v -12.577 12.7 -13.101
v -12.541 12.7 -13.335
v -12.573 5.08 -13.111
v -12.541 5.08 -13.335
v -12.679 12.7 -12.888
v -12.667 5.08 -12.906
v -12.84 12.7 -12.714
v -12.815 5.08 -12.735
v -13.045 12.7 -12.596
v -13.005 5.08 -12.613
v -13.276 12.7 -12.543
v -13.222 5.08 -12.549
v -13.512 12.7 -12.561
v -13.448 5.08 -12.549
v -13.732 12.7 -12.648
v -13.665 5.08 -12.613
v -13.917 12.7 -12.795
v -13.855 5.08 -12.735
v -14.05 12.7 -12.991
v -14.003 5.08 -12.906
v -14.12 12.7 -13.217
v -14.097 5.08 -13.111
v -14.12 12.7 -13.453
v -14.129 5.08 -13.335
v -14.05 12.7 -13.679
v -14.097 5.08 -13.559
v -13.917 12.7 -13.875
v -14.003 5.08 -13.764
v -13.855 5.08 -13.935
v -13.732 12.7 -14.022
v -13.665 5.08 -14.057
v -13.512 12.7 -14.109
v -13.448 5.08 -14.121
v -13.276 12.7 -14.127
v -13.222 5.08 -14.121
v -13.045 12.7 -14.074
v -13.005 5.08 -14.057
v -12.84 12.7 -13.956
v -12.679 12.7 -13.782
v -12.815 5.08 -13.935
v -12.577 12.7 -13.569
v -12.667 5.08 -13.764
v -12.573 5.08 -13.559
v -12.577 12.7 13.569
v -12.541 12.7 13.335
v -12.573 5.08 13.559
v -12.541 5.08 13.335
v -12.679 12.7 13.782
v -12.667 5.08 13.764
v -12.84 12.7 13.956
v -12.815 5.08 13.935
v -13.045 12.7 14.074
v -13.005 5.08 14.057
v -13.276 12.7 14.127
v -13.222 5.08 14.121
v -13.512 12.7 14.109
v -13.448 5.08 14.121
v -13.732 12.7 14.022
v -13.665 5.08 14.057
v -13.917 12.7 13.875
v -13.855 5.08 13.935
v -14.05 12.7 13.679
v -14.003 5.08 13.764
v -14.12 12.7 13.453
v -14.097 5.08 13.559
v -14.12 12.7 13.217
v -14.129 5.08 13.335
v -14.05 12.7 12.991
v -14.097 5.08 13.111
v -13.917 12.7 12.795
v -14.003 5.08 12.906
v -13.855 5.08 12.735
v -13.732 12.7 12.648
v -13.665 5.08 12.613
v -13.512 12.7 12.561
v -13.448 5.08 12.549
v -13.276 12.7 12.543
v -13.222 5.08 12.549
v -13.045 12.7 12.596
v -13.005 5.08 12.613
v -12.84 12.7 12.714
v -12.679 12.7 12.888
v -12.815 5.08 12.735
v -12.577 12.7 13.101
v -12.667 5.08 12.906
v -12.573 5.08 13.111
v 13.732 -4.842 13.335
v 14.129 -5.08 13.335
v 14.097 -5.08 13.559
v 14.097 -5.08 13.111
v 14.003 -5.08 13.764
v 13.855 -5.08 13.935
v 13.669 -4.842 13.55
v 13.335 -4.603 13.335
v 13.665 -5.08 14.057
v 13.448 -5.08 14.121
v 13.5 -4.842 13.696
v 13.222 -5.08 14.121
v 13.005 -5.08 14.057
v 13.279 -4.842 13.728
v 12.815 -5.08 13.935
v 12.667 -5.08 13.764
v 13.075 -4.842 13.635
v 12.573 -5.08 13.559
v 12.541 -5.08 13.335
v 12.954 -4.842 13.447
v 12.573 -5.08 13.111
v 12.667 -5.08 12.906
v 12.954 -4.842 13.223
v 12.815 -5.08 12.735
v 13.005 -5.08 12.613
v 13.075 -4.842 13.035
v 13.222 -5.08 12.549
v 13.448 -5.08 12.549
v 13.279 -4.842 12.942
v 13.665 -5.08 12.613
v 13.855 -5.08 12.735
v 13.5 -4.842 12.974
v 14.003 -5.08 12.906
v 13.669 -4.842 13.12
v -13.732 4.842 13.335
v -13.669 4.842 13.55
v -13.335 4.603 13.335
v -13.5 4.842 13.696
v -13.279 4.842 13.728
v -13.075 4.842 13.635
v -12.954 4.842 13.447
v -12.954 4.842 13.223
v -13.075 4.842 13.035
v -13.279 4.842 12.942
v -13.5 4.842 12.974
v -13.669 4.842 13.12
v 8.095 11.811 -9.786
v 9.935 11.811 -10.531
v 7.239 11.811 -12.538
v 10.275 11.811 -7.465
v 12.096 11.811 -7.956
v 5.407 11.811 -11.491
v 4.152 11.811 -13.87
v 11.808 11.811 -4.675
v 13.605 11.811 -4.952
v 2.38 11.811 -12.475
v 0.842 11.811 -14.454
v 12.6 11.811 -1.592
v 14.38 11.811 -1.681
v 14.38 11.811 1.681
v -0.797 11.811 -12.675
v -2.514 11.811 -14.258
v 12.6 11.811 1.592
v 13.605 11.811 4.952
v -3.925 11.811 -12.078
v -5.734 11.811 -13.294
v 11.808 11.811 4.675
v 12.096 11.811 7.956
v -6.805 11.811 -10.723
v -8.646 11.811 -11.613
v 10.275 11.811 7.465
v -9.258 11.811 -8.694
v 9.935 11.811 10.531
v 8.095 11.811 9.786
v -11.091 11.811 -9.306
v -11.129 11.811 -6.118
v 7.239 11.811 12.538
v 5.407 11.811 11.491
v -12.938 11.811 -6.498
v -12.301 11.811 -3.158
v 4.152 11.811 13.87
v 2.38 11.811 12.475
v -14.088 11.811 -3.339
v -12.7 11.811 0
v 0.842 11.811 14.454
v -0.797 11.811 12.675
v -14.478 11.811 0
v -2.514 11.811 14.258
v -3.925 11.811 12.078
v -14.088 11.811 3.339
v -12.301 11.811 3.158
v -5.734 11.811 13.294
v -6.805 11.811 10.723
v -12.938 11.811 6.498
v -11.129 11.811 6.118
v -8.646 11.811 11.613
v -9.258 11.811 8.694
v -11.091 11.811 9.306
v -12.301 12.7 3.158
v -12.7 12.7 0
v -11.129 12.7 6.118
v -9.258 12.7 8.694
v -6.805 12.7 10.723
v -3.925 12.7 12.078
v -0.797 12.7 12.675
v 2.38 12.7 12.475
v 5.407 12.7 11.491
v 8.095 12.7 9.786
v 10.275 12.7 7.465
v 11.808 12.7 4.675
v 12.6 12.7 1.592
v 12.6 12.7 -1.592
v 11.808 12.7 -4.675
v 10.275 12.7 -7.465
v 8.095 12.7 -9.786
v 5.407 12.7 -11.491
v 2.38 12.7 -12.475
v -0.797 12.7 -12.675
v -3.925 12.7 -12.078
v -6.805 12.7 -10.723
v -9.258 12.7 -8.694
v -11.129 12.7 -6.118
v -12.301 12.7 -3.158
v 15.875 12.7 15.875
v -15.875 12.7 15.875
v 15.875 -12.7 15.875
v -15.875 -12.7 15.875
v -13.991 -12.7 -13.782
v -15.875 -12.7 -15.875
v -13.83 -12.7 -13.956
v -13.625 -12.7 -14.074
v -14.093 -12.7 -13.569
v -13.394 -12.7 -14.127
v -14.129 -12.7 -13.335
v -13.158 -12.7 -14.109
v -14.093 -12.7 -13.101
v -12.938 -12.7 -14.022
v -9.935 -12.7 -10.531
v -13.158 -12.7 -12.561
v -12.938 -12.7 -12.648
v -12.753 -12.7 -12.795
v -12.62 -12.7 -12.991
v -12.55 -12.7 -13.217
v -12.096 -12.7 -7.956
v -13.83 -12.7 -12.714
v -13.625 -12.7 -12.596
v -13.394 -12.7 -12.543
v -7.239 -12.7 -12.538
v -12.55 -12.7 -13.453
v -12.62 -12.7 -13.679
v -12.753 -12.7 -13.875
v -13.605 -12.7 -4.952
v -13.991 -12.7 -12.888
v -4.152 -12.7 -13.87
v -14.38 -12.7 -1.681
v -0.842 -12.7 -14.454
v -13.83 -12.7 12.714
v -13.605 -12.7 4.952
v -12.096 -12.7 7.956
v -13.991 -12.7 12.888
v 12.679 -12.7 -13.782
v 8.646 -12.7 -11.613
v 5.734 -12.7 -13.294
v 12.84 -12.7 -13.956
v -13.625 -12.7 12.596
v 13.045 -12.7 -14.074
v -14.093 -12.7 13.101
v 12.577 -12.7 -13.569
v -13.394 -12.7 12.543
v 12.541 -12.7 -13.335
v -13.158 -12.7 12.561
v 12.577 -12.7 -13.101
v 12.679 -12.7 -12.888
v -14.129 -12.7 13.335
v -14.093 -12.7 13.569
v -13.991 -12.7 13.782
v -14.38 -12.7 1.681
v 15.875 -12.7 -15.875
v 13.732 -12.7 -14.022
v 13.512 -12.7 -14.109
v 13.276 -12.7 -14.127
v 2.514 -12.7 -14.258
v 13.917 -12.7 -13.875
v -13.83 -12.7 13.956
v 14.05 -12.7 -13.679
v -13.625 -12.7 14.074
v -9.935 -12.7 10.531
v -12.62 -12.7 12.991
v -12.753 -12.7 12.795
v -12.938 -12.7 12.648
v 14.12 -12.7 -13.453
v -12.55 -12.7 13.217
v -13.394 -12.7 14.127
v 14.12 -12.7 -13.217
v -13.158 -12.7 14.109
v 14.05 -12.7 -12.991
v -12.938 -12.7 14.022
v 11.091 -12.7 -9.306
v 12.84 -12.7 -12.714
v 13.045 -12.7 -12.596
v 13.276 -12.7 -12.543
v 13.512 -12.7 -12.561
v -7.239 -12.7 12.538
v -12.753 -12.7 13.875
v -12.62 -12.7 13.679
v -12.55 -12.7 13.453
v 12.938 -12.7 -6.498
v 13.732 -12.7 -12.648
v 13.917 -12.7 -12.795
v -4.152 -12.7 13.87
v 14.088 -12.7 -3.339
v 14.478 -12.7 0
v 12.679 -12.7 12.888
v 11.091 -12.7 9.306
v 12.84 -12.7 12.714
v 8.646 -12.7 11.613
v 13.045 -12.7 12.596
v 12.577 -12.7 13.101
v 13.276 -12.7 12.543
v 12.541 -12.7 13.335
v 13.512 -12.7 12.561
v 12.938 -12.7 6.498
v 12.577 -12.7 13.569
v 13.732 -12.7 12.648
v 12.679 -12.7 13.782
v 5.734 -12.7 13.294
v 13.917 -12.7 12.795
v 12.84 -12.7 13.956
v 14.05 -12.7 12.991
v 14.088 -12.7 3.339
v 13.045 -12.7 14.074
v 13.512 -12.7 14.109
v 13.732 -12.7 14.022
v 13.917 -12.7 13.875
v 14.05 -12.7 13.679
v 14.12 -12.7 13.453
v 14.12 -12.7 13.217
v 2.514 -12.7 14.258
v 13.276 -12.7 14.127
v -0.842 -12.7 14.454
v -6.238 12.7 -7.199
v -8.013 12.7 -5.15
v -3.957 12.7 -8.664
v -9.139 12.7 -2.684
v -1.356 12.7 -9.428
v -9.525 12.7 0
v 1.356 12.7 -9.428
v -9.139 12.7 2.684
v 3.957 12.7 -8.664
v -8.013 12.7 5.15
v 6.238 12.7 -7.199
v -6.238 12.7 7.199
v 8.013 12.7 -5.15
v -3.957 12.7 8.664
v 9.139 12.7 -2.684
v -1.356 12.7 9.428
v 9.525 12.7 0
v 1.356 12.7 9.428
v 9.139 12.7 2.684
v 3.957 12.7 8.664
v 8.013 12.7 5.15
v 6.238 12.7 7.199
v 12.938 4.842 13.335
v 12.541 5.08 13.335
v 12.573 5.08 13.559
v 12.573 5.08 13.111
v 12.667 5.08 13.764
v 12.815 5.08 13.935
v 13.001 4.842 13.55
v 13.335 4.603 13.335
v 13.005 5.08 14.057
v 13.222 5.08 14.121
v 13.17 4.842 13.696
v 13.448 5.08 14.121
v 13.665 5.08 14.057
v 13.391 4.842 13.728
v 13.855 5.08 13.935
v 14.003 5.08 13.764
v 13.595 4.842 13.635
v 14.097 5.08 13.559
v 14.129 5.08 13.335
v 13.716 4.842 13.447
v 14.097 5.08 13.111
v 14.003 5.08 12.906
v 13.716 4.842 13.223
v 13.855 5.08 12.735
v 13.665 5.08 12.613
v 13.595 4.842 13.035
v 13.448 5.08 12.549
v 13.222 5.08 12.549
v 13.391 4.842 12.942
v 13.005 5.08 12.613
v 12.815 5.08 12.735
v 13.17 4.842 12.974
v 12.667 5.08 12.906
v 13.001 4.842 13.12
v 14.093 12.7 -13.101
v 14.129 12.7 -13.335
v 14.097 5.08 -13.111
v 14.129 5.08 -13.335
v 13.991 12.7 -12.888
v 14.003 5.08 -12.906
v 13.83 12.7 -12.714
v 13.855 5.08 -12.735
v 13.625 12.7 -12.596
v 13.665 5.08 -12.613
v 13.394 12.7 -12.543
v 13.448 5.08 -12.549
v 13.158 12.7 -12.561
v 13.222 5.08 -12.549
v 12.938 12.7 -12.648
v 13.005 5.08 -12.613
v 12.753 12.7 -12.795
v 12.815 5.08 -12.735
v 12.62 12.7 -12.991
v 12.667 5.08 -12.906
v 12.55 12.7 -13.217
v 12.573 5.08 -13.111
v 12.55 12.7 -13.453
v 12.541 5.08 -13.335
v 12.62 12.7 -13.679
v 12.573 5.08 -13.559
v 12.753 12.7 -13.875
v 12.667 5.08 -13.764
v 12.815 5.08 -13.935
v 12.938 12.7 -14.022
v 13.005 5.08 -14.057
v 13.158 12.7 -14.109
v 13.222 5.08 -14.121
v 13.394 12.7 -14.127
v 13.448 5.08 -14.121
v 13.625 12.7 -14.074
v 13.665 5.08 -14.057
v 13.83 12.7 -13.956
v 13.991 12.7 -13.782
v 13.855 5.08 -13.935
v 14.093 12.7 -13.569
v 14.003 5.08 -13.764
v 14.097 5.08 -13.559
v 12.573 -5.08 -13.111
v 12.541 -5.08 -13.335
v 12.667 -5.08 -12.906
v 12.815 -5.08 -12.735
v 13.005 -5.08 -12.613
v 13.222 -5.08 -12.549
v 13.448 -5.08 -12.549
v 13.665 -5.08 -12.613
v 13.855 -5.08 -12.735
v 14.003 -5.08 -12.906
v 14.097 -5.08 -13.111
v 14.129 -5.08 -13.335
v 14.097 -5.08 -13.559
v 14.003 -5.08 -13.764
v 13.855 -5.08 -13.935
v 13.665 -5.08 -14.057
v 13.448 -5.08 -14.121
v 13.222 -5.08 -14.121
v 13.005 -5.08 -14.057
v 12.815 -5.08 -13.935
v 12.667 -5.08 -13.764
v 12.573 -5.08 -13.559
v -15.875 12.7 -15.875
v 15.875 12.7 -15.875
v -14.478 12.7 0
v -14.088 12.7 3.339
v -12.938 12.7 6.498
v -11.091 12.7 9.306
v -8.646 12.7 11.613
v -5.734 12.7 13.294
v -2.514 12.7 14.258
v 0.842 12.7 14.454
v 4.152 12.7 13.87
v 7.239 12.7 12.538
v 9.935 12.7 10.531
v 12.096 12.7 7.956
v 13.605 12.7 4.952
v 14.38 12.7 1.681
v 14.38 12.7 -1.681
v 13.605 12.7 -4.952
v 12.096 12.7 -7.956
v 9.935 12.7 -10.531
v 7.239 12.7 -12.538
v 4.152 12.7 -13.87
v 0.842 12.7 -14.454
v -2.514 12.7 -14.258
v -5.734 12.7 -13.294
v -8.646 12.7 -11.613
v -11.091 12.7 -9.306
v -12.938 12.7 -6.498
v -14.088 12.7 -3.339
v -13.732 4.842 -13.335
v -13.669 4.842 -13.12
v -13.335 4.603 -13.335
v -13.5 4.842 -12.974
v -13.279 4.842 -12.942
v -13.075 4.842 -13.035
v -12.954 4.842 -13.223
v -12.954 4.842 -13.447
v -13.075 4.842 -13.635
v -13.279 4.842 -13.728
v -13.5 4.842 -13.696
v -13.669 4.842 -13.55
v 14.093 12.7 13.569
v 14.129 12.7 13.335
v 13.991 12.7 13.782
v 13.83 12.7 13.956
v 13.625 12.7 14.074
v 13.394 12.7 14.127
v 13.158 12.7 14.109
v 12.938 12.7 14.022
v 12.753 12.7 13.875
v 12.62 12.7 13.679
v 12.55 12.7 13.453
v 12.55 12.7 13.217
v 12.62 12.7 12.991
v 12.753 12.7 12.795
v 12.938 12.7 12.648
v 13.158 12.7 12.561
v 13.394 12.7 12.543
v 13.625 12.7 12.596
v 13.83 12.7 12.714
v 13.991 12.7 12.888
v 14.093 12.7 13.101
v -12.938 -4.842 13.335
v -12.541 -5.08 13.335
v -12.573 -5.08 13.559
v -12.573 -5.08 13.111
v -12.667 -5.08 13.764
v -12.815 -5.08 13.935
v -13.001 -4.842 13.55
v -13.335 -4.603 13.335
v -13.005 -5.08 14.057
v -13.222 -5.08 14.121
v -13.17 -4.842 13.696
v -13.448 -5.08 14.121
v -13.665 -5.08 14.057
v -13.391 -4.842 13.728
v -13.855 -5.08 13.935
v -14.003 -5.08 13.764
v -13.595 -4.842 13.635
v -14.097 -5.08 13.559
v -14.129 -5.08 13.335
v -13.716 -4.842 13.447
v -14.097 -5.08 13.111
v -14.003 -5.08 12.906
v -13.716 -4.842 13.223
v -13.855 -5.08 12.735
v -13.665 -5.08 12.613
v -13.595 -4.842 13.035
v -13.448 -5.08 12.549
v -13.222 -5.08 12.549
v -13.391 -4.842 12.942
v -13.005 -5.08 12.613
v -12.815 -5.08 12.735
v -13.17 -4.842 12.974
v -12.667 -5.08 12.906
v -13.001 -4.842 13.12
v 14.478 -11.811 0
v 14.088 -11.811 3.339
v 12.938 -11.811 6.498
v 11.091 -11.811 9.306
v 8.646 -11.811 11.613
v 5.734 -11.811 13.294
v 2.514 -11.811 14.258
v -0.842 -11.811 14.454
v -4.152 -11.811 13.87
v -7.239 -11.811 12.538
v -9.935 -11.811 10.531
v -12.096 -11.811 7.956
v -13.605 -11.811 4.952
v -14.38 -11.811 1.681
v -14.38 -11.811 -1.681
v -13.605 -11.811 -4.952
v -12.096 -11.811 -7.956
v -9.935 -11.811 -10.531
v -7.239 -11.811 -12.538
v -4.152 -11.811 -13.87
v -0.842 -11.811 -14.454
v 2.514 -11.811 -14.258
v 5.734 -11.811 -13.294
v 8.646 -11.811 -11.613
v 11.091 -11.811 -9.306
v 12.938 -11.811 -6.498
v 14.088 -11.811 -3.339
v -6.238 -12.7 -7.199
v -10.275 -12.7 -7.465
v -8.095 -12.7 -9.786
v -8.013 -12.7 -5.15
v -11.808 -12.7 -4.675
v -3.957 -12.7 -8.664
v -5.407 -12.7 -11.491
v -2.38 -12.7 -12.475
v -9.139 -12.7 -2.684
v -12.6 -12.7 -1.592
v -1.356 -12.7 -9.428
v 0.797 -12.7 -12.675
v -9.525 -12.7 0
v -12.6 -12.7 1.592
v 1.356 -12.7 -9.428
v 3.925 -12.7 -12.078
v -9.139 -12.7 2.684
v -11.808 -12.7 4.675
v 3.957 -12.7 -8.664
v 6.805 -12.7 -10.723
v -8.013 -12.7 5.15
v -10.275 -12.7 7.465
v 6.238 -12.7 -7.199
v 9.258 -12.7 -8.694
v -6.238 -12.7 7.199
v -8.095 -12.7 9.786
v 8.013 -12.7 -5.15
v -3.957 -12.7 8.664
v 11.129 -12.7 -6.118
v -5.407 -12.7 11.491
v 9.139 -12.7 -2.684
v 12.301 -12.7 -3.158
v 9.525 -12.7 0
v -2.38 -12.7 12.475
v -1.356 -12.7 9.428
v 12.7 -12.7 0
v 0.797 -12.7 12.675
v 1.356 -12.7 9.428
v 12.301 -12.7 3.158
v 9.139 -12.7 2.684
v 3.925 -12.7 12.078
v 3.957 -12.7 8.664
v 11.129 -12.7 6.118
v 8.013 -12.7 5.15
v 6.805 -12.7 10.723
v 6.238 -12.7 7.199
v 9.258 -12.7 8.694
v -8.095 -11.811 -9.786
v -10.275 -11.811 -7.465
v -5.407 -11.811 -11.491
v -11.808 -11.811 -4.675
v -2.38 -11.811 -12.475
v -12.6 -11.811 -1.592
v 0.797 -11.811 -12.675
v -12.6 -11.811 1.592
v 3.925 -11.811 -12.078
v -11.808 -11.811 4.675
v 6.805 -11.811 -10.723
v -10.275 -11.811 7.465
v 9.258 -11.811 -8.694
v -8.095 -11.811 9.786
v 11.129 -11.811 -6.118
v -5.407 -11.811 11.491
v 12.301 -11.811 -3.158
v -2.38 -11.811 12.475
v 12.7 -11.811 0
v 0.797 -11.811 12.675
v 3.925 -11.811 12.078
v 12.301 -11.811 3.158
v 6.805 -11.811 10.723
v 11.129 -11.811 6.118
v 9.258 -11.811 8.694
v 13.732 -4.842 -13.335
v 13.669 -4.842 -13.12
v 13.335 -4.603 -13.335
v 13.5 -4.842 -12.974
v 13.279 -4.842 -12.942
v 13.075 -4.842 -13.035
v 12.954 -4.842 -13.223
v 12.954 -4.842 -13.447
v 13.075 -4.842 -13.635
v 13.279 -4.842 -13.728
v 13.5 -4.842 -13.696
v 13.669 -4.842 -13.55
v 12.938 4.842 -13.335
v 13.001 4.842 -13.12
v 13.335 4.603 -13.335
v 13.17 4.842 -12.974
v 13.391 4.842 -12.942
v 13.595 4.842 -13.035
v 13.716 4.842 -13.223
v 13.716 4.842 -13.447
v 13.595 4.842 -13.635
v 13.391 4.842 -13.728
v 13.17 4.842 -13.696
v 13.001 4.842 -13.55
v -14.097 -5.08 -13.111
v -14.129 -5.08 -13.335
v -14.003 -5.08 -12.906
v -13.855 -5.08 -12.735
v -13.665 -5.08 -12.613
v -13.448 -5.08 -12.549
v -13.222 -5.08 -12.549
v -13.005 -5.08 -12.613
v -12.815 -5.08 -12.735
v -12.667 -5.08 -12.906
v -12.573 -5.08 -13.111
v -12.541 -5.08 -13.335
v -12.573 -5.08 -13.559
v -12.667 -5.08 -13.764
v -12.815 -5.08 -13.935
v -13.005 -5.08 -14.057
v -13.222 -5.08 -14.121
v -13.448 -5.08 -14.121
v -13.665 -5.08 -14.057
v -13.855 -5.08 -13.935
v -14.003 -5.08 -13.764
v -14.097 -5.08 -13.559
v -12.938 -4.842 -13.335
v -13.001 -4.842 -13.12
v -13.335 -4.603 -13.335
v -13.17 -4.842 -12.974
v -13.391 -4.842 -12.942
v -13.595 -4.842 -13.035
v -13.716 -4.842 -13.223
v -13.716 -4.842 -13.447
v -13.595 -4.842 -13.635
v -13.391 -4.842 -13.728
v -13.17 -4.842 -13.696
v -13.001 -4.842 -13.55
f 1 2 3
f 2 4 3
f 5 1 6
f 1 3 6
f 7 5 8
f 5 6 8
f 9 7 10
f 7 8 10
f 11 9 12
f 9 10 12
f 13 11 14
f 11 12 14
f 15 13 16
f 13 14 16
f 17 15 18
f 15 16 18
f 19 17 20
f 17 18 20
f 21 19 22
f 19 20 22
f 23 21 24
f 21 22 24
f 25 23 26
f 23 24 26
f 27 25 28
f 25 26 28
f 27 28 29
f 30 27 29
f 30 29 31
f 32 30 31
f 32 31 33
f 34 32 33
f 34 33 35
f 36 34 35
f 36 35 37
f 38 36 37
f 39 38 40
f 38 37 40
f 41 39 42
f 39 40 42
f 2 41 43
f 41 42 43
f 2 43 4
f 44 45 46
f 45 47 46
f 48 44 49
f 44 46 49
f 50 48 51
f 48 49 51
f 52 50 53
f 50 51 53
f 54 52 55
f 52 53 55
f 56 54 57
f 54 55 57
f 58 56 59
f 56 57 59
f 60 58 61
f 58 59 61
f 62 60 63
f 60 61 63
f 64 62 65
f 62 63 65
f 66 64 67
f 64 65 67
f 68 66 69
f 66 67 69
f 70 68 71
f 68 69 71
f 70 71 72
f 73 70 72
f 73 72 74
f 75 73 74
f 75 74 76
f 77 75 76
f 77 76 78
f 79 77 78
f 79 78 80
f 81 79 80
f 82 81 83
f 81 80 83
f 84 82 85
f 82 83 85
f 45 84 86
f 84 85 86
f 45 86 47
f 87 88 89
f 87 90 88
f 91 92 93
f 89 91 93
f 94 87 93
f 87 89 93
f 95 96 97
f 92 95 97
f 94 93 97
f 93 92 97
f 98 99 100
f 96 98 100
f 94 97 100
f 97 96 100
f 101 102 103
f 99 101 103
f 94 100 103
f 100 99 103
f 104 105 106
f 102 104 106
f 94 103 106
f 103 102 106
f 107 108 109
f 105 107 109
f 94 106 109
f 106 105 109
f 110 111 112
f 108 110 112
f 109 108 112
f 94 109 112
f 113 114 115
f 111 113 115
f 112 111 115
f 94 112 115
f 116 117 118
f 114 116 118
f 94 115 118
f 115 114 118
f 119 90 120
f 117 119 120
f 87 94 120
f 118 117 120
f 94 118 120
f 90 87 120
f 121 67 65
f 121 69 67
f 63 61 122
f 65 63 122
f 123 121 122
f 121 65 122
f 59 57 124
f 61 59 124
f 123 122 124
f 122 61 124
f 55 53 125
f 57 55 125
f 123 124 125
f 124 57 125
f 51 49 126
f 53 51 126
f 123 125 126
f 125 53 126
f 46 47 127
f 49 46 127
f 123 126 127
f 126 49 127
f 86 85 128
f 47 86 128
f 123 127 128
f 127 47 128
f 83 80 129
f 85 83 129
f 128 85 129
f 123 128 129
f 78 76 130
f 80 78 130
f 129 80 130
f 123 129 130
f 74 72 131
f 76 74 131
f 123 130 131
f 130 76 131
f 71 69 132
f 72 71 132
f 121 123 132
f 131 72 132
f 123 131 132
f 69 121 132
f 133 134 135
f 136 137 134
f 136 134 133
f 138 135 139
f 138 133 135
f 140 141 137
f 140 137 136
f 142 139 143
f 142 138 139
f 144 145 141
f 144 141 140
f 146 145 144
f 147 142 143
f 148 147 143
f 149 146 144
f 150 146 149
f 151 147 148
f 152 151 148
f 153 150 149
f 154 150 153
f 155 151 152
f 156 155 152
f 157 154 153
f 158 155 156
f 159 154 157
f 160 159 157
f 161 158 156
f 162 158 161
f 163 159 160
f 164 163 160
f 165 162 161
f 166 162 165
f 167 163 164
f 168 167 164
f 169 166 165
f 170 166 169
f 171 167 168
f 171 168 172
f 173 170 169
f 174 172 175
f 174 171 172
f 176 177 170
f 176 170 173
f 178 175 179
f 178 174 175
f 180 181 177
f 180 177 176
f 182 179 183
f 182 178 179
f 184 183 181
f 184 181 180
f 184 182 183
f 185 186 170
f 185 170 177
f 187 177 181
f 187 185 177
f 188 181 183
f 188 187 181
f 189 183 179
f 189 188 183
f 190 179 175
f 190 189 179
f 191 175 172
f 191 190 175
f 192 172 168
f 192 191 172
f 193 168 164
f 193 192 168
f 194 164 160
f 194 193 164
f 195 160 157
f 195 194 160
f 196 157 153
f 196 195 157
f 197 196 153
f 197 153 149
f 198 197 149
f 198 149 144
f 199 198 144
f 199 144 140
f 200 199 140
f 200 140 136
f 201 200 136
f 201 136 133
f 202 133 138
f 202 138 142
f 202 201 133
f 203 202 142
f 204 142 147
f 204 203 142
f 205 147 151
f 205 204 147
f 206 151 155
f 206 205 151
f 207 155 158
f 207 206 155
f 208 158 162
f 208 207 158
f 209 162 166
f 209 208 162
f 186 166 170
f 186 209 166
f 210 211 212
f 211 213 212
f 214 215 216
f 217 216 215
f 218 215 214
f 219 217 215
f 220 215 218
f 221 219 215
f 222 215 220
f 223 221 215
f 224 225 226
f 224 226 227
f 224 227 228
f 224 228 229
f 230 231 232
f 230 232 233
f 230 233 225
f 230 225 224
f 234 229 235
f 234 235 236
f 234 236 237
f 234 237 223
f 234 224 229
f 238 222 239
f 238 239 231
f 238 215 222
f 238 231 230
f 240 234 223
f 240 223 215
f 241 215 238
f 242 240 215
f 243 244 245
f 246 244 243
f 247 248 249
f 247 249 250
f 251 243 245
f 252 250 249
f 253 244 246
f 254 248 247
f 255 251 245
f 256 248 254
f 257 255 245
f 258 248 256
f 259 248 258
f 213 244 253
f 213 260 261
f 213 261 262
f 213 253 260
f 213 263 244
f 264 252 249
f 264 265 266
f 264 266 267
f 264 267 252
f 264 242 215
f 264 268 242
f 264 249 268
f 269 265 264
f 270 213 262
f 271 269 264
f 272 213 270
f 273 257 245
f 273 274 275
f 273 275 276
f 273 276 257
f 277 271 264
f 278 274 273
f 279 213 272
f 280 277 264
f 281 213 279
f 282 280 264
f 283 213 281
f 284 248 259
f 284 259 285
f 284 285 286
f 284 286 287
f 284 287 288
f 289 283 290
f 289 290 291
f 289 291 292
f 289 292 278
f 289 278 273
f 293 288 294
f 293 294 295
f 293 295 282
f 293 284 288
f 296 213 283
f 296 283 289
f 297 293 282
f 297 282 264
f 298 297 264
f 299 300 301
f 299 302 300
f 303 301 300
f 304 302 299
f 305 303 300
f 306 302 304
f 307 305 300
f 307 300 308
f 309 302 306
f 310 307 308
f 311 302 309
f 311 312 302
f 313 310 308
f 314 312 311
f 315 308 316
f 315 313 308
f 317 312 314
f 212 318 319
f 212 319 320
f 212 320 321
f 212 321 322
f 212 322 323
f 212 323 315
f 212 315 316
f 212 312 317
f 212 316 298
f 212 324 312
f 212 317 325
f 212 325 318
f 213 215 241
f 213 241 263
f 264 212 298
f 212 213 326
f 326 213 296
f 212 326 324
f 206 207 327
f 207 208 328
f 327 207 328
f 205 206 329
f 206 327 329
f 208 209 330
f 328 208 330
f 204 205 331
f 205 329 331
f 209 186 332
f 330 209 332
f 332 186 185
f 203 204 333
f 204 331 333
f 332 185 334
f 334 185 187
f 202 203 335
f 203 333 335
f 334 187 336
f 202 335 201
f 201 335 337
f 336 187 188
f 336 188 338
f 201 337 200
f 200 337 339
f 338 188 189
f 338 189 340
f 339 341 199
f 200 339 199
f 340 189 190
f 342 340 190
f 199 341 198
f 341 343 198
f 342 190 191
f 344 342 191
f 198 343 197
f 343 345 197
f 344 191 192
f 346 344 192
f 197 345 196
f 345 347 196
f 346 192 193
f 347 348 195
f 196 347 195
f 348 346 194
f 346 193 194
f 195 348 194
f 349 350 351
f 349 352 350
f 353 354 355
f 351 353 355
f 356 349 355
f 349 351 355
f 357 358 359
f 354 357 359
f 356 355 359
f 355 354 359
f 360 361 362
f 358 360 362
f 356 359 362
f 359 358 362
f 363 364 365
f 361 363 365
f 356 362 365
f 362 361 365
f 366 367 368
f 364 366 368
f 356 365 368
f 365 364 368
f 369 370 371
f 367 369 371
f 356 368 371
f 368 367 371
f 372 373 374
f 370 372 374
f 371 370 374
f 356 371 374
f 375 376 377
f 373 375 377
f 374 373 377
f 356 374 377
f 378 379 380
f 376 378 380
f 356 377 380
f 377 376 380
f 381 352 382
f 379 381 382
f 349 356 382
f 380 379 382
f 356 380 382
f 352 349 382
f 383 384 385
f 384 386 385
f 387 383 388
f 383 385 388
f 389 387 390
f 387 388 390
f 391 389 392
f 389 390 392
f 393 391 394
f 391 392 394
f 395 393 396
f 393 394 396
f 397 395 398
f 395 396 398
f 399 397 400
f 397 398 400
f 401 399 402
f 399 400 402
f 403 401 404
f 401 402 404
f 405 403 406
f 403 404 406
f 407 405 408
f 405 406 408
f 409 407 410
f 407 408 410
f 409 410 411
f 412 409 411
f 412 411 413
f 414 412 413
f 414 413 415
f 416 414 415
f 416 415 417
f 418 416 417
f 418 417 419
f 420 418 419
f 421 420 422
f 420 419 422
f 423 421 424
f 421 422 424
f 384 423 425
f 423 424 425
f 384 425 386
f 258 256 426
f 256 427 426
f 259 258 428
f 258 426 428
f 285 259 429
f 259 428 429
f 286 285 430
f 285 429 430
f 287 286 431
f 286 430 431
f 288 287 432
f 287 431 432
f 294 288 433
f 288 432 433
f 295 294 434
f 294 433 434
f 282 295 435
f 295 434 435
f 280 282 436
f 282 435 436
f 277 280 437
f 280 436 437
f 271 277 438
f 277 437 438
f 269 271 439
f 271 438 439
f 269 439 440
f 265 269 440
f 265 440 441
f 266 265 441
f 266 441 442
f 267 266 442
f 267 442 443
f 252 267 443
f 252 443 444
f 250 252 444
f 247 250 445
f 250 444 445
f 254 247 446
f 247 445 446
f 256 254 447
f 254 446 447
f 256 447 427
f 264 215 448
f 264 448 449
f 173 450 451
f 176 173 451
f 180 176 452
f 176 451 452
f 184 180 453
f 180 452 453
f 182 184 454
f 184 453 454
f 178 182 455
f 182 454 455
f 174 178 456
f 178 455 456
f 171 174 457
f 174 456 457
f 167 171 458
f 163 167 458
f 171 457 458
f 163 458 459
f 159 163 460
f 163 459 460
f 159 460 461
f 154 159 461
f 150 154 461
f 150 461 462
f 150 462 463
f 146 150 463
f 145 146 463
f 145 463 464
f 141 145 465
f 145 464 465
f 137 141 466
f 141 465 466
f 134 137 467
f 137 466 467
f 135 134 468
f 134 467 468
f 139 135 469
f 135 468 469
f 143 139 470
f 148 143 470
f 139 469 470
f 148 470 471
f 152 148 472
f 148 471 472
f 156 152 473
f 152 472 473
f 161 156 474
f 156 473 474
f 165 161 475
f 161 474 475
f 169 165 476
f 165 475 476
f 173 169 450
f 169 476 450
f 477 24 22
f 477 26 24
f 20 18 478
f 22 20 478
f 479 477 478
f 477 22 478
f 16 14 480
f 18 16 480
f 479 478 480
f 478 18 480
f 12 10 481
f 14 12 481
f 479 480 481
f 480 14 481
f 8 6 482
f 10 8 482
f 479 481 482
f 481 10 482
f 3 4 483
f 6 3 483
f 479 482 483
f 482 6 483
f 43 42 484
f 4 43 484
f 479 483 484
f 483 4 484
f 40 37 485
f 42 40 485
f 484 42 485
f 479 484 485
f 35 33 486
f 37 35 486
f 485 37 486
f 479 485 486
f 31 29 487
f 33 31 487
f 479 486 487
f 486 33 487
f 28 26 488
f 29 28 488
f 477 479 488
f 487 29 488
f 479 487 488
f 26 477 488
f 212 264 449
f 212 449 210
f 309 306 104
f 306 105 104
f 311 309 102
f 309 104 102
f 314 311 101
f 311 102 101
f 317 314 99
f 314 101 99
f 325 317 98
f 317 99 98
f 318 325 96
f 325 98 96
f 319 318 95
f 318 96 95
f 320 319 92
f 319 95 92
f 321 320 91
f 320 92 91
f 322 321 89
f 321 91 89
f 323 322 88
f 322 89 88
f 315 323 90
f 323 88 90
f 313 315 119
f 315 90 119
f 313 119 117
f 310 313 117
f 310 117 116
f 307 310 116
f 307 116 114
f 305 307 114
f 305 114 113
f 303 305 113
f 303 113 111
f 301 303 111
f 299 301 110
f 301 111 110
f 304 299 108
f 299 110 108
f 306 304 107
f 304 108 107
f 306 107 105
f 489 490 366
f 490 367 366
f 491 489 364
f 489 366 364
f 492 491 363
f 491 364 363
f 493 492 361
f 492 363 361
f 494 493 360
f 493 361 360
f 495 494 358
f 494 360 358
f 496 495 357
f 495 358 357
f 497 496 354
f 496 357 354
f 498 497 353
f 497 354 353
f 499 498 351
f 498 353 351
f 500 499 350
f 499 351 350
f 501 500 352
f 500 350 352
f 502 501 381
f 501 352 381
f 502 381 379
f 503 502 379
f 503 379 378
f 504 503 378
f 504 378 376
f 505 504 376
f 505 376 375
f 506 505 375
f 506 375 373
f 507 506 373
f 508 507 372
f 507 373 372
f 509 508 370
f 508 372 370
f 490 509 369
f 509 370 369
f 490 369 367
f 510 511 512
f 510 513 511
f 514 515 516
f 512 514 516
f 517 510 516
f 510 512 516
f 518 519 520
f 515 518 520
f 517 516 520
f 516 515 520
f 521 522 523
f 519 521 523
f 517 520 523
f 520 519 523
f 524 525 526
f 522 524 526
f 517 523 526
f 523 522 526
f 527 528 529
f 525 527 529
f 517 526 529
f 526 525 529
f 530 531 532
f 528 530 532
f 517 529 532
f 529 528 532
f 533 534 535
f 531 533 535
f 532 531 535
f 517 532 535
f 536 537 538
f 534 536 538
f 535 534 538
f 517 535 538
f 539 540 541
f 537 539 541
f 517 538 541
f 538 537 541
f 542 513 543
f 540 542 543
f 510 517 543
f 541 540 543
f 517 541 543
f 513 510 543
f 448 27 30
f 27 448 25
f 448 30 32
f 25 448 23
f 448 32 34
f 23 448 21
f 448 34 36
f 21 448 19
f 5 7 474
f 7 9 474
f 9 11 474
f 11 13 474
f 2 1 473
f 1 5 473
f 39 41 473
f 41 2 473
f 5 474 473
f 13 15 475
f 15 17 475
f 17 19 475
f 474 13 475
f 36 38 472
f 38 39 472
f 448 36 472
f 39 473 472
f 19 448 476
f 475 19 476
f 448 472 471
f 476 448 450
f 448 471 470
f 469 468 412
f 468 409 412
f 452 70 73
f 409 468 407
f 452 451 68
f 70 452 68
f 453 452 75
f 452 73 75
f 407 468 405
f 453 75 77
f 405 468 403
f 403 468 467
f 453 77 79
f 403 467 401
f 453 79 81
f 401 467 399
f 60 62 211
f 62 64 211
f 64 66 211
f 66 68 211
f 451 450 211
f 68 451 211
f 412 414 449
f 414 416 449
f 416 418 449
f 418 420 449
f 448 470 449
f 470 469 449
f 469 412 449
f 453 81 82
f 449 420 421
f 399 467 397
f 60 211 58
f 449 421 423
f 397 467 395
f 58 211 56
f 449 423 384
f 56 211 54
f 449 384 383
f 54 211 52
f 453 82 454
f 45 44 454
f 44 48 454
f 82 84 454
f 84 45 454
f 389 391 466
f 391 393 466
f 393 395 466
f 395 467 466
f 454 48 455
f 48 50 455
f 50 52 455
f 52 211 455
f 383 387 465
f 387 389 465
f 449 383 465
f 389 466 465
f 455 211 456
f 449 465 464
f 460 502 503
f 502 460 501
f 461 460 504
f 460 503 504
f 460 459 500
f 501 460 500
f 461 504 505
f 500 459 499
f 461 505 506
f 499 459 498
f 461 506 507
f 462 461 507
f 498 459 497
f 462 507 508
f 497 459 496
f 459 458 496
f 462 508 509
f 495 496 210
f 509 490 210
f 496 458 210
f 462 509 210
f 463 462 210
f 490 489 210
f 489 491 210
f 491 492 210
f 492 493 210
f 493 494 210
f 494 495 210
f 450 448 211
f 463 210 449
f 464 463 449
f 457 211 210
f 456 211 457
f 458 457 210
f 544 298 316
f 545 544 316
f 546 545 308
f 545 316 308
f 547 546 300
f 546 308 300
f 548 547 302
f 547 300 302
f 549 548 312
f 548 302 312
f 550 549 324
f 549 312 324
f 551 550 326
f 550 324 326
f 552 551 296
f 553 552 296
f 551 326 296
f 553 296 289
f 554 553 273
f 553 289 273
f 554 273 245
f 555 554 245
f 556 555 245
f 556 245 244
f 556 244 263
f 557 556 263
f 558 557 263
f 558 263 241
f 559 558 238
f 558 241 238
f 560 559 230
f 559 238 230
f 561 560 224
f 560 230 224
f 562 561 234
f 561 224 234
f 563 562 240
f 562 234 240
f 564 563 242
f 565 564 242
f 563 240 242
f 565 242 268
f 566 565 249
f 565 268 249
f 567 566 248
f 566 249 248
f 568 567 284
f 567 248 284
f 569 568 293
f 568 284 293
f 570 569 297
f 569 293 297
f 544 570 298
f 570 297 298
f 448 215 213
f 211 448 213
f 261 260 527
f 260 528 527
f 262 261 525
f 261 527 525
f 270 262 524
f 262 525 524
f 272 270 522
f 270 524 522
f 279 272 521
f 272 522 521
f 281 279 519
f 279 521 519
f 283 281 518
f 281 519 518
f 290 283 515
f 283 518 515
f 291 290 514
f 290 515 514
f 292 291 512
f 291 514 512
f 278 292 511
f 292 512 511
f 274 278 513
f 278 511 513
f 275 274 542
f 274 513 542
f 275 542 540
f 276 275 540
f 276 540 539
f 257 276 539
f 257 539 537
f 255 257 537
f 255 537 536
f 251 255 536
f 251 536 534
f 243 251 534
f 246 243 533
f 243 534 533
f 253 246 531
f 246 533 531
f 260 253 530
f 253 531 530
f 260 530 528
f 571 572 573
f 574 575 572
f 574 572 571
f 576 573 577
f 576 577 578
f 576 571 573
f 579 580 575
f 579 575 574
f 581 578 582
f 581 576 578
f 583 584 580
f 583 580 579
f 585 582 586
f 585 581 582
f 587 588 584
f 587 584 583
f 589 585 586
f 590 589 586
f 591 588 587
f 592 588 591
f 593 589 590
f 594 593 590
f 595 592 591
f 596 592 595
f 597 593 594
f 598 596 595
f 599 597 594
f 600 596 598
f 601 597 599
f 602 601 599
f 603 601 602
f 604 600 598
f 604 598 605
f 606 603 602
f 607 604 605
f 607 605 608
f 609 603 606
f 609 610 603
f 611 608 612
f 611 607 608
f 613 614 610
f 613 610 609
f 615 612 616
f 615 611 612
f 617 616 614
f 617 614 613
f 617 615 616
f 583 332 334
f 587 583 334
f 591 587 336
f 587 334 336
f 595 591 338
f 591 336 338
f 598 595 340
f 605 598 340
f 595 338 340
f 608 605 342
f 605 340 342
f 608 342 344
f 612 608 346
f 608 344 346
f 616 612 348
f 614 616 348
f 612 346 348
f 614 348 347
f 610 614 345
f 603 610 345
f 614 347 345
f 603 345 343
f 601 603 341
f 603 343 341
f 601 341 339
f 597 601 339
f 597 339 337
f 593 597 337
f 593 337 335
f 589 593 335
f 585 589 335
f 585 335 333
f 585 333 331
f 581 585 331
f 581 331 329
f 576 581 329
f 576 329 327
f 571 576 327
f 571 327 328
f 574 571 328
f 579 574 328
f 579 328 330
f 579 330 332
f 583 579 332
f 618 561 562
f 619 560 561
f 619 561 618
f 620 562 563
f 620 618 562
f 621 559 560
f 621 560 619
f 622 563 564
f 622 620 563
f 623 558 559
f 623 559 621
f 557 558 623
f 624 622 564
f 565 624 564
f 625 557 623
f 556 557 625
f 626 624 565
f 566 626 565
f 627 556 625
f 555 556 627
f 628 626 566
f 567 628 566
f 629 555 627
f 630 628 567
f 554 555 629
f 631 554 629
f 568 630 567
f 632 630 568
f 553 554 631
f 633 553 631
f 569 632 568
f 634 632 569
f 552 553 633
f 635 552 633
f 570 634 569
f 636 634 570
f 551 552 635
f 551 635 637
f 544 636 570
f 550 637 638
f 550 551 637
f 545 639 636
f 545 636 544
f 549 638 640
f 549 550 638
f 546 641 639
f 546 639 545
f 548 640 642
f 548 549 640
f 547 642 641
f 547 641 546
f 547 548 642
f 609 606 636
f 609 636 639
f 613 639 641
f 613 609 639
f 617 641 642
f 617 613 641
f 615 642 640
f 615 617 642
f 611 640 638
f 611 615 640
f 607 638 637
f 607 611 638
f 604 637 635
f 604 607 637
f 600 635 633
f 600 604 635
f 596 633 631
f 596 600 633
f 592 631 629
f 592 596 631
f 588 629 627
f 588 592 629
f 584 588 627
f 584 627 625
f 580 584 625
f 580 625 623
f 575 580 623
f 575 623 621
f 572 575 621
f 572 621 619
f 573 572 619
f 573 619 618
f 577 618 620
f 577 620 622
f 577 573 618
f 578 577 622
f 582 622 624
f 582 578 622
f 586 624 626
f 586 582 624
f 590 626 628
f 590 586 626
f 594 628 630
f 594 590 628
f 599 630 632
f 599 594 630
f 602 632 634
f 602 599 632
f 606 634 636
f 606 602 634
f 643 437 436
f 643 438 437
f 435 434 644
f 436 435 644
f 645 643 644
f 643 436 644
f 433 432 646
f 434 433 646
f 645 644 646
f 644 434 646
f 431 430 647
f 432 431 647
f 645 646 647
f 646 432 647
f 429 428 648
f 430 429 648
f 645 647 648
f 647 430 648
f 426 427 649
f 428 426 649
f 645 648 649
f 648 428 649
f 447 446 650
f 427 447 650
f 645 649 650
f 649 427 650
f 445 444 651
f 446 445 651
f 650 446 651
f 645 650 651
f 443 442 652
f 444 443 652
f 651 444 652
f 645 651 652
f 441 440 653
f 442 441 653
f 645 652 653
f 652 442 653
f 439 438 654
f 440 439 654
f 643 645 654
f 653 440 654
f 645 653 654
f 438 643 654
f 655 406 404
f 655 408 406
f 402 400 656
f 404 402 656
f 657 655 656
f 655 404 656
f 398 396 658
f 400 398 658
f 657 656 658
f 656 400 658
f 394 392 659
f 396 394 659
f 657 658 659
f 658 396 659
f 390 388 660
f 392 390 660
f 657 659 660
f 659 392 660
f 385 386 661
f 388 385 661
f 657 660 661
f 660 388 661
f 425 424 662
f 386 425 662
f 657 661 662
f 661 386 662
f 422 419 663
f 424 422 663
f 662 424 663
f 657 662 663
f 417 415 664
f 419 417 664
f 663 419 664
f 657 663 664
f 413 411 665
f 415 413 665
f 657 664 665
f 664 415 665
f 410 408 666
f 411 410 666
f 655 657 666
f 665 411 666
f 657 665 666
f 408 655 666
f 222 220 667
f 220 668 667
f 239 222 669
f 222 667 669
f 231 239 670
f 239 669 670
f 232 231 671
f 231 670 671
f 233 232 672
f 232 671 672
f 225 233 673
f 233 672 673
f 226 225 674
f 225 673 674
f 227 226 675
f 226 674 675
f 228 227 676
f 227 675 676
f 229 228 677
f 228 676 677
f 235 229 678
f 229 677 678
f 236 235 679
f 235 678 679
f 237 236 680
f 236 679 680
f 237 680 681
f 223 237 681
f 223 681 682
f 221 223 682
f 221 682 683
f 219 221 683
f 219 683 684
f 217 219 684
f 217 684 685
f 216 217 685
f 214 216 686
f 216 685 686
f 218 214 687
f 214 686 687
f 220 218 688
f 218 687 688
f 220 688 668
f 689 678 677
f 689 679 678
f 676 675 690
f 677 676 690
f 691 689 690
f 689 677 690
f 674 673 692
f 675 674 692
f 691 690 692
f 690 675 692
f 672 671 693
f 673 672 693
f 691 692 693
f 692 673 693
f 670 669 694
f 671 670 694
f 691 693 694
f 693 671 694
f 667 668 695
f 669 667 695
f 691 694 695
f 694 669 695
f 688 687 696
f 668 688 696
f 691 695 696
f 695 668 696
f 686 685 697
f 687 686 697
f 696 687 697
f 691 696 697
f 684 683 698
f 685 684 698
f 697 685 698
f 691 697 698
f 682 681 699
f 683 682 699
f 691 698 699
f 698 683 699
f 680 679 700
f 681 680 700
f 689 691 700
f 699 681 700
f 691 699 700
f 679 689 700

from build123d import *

# Parameters (mm, degrees)
F0_W      = 31.75
F0_H      = 31.75
F1_DEPTH  = 12.7
F3_D      = 19.05
F4_R      = 14.478
F4_R_2    = 12.7
F5_DEPTH  = 0.889
F6_R      = 14.478
F6_R_2    = 12.7
F7_DEPTH  = 0.889
F9_D      = 1.5875
F9_DEPTH  = 7.62
F9_TIP    = 0.4769331164
F11_D     = 1.5875
F11_DEPTH = 7.62
F11_TIP   = 0.4769331164


with BuildPart() as f1:
    # F0 (on Front) → F1 (new body, symmetric)
    with BuildSketch(Plane.XZ):
        Rectangle(F0_W, F0_H)
    extrude(amount=F1_DEPTH, both=True)

    # F3 (through all)
    with Locations(Plane.XZ.offset(12.7)):
        with Locations((0, 0)):
            Hole(F3_D / 2)

    # F4 (on face) → F5 (cut)
    with BuildSketch(Plane.XZ.offset(12.7)):
        Circle(F4_R)
        Circle(F4_R_2, mode=Mode.SUBTRACT)
    extrude(amount=-F5_DEPTH, mode=Mode.SUBTRACT)

    # F6 (on face) → F7 (cut)
    with BuildSketch(Plane(origin=(0, 12.7, 0), x_dir=(-1, 0, 0), z_dir=(0, 1, 0))):
        Circle(F6_R)
        Circle(F6_R_2, mode=Mode.SUBTRACT)
    extrude(amount=-F7_DEPTH, mode=Mode.SUBTRACT)

    # F9
    with Locations(Plane(origin=(0, 12.7, 0), x_dir=(-1, 0, 0), z_dir=(0, 1, 0))):
        with Locations((-13.335, 13.335), (13.335, 13.335), (13.335, -13.335), (-13.335, -13.335)):
            Hole(F9_D / 2, depth=F9_DEPTH)
            with Locations((0, 0, -(F9_DEPTH + F9_TIP / 2))):  # 118° drill point
                Cone(0, F9_D / 2, F9_TIP, mode=Mode.SUBTRACT)

    # F11
    with Locations(Plane.XZ.offset(12.7)):
        with Locations((-13.335, 13.335), (13.335, 13.335), (13.335, -13.335), (-13.335, -13.335)):
            Hole(F11_D / 2, depth=F11_DEPTH)
            with Locations((0, 0, -(F11_DEPTH + F11_TIP / 2))):  # 118° drill point
                Cone(0, F11_D / 2, F11_TIP, mode=Mode.SUBTRACT)


solid = f1.part
